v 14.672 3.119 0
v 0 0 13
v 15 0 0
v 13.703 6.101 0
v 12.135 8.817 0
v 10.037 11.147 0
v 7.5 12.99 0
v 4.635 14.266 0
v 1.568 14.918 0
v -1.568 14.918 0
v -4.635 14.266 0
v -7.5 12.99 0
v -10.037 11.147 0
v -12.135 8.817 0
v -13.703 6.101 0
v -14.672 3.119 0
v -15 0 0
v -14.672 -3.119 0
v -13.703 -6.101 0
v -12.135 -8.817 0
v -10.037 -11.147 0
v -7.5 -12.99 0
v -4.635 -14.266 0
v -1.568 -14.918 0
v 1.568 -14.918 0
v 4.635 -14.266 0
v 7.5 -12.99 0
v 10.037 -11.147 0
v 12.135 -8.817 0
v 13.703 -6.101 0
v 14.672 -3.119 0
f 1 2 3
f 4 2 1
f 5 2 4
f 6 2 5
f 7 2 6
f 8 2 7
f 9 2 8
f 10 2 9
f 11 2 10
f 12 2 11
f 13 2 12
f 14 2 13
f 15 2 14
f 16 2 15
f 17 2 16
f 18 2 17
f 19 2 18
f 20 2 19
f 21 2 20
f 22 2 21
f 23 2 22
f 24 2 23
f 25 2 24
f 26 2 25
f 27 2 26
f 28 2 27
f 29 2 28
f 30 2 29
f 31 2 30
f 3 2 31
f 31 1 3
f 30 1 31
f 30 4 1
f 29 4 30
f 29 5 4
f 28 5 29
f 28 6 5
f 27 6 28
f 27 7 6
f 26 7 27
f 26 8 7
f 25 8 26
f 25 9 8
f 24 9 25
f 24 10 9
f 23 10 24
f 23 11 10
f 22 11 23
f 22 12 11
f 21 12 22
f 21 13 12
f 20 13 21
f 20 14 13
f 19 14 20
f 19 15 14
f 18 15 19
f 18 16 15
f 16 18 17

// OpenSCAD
// Generated by SolidPython 1.0.1 on 2020-07-29 00:46:43


cylinder(h = 13, r1 = 15, r2 = 0);
/***********************************************
*********      SolidPython code:      **********
************************************************
 
# import packages: SolidPython
from solid import *
from solid.utils import *
from itertools import chain, combinations, permutations


class Resize:

    def __init__(self, scad_file):
        self.scad_file = scad_file
        #self.scad_file = import_scad(scad_file)
        # cone/cylinder param:
        self.r1 = 0
        self.r2 = 0
        self.h = 0
        # rectangular prism param:
        self.w = 0
        self.l = 0
        # ellipse param:
        self.r = 0

    # import OpenScad code (file name corresponds to shape)


    # classify shape + parameters
    def assign(self, param1, param2, param3):
        if self.scad_file == 'cone.scad':
            self.r1 = param1
            self.r2 = param2
            self.h = param3
        elif self.scad_file == 'cylinder.scad':
            self.r1 = param1
            self.r2 = param2
            self.h = param3
        elif self.scad_file == 'rectangularPrism.scad':
            self.h = param1
            self.l = param2
            self.w = param3
        else:
            self.r = param1
            self.h = param2

    # resize parameters
    def iterate(self):
        x = range(3, 20, 2)
        i = 1
        if self.scad_file == 'cone.scad':
            tempList = list(permutations(x, 2))
            for temp in tempList:
                param1 = temp[0]
                param2 = temp[1]
                filepath = 'produced_scad_files/' + 'cone' + str(param1) + '_' + str(param2) + '_' + '.scad'
                scad_render_to_file(cylinder(h=param1, r1=param2, r2=0), filepath)

        elif self.scad_file == 'cylinder.scad':
            tempList = list(permutations(x, 3))
            for temp in tempList:
                param1 = temp[0]
                param2 = temp[1]
                filepath = 'produced_scad_files/' + 'cylinder' + str(param1) + '_' + str(param2) + '_' + '.scad'
                scad_render_to_file(cylinder(h=param1, r1=param2, r2=param2), filepath)

        elif self.scad_file == 'rectangularPrism.scad':
            tempList = list(permutations(x, 3))
            for temp in tempList:
                param1 = temp[0]
                param2 = temp[1]
                param3 = temp[2]
                filepath = 'produced_scad_files/' + 'rectangularPrism' + str(param1) + '_' + str(param2) + '_' + str(
                    param3) + '.scad'
                scad_render_to_file(cube(size=(param1, param2, param3)), filepath)

        elif self.scad_file == 'ellipse.scad':
            tempList = list(permutations(x, 4))
            for temp in tempList:
                param1 = temp[0]
                param2 = temp[1]
                param3 = temp[2]
                param4 = temp[3]
                filepath = 'produced_scad_files/' + 'ellipse' + str(param1) + '_' + str(param2) + '_' + str(param3) + '_' + str(param4) + '.scad'
                scad_render_to_file(scale([param1, param2, param3])(sphere(r=param4)), filepath)

    def render_to_scadfile(self):
        scad_render_to_file(scad, 'example.scad') 
 
************************************************/
